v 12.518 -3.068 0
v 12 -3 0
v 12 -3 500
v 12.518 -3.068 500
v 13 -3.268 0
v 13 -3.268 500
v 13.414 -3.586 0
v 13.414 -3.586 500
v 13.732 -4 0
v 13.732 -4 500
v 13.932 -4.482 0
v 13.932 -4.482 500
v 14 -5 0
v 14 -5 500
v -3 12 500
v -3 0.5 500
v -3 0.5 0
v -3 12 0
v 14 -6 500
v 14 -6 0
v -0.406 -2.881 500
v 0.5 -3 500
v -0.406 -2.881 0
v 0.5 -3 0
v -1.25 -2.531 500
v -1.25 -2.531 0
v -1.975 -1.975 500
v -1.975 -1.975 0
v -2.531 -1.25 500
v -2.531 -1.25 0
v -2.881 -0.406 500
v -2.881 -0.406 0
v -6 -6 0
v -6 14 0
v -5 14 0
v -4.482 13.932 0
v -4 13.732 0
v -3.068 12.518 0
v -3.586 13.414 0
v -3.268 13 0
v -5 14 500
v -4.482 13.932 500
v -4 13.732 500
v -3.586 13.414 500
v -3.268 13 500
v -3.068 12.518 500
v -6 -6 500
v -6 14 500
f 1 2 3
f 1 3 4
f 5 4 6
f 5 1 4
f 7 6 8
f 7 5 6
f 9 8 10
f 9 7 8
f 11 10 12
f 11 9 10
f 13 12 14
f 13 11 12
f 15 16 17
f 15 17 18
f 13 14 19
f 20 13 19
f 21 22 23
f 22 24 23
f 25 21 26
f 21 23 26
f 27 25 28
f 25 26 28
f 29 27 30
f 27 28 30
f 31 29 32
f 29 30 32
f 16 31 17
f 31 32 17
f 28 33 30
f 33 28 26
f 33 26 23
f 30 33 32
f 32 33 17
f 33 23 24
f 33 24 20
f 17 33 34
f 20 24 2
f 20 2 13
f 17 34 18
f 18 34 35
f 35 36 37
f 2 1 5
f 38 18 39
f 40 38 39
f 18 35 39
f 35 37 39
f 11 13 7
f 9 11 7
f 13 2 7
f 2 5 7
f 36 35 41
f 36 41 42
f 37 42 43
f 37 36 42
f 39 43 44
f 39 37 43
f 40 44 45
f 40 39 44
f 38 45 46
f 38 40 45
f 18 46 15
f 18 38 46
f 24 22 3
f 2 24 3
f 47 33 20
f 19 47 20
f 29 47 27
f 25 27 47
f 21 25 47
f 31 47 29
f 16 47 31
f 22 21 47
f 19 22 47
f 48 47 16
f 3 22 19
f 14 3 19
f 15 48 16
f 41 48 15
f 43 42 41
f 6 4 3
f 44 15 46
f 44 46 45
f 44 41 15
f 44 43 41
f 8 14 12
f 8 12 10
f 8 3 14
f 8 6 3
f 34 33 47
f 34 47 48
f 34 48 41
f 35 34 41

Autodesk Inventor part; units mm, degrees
ref_plane "YZ Plane" through (0, 0, 0) normal (1, 0, 0) x (0, 1, 0)
ref_plane "Start plane" through (0, 0, 0) normal (0, 0, 1) x (1, 0, 0)
ref_plane "End plane" through (0, 0, 500) normal (0, 0, 1) x (1, 0, 0)
sketch "Sketch" plane through (0, 0, 0) normal (0, 0, 1) x (1, 0, 0)
  line L0 (-3, 0.5) -> (-3, 12)
  line L1 (-6, 14) -> (-5, 14)
  line L2 (-6, -6) -> (-6, 14)
  line L3 (-6, -6) -> (14, -6)
  line L4 (14, -5) -> (14, -6)
  line L5 (0.5, -3) -> (12, -3)
  arc A0 (-3, 0.5) -> (0.5, -3) centre (0.5, 0.5) ccw
  arc A1 (-3, 12) -> (-5, 14) centre (-5, 12) ccw
  arc A2 (14, -5) -> (12, -3) centre (12, -5) ccw
  line L6 (0, 18.4971) -> (0, -10.0828) construction
  line L7 (-10.0828, 0) -> (18.4971, 0) construction
  point P0 (-3, -3)
  point P1 (-3, 14)
  point P2 (14, -3)
  dimension "d4" = 20
  dimension "d6" = 20
  dimension "d8" = 3
  dimension "d10" = 3
  dimension "d17" = 3.5
  dimension "d18" = 2
  dimension "d19" = 6
  dimension "d20" = 6
extrude "Body" add sketch "Sketch" along normal up to surface (500 mm away) from surface at 0
sketch "Sketch3" plane through (0, 0, 0) normal (0, 0, 1) x (1, 0, 0)
  line L0 (0, 0) -> (10, 0)
ref_plane "Work Plane10" through (0, 0, 0) normal (0, -1, 0) x (1, 0, 0)
sketch "Sketch4" plane through (0, 0, 0) normal (0, -1, 0) x (1, 0, 0)
  line L0 (-2, 0) -> (12, 0)
  line L1 (-2, 500) -> (12, 500)
  dimension "d24" = 500
equation "\"d4\" = b"
equation "\"d6\" = b"
equation "\"d8\" = ParT"
equation "\"d10\" = ParT"
equation "\"d17\" = R"
equation "\"d18\" = R1"
equation "\"d19\" = ex"
equation "\"d20\" = d19"
equation "\"d11\" = G_L"
equation "\"b\" = 20"
equation "\"ParT\" = 3"
equation "\"R\" = 3.5"
equation "\"R1\" = 2"
equation "\"G_L\" = d24"
equation "\"ex\" = 6"
equation "\"G_OFFSET_START\" = 0"
equation "\"G_OFFSET_END\" = 0"
properties part number "ISO 657-1 - L20x20x3-500" material "Stainless Steel"
